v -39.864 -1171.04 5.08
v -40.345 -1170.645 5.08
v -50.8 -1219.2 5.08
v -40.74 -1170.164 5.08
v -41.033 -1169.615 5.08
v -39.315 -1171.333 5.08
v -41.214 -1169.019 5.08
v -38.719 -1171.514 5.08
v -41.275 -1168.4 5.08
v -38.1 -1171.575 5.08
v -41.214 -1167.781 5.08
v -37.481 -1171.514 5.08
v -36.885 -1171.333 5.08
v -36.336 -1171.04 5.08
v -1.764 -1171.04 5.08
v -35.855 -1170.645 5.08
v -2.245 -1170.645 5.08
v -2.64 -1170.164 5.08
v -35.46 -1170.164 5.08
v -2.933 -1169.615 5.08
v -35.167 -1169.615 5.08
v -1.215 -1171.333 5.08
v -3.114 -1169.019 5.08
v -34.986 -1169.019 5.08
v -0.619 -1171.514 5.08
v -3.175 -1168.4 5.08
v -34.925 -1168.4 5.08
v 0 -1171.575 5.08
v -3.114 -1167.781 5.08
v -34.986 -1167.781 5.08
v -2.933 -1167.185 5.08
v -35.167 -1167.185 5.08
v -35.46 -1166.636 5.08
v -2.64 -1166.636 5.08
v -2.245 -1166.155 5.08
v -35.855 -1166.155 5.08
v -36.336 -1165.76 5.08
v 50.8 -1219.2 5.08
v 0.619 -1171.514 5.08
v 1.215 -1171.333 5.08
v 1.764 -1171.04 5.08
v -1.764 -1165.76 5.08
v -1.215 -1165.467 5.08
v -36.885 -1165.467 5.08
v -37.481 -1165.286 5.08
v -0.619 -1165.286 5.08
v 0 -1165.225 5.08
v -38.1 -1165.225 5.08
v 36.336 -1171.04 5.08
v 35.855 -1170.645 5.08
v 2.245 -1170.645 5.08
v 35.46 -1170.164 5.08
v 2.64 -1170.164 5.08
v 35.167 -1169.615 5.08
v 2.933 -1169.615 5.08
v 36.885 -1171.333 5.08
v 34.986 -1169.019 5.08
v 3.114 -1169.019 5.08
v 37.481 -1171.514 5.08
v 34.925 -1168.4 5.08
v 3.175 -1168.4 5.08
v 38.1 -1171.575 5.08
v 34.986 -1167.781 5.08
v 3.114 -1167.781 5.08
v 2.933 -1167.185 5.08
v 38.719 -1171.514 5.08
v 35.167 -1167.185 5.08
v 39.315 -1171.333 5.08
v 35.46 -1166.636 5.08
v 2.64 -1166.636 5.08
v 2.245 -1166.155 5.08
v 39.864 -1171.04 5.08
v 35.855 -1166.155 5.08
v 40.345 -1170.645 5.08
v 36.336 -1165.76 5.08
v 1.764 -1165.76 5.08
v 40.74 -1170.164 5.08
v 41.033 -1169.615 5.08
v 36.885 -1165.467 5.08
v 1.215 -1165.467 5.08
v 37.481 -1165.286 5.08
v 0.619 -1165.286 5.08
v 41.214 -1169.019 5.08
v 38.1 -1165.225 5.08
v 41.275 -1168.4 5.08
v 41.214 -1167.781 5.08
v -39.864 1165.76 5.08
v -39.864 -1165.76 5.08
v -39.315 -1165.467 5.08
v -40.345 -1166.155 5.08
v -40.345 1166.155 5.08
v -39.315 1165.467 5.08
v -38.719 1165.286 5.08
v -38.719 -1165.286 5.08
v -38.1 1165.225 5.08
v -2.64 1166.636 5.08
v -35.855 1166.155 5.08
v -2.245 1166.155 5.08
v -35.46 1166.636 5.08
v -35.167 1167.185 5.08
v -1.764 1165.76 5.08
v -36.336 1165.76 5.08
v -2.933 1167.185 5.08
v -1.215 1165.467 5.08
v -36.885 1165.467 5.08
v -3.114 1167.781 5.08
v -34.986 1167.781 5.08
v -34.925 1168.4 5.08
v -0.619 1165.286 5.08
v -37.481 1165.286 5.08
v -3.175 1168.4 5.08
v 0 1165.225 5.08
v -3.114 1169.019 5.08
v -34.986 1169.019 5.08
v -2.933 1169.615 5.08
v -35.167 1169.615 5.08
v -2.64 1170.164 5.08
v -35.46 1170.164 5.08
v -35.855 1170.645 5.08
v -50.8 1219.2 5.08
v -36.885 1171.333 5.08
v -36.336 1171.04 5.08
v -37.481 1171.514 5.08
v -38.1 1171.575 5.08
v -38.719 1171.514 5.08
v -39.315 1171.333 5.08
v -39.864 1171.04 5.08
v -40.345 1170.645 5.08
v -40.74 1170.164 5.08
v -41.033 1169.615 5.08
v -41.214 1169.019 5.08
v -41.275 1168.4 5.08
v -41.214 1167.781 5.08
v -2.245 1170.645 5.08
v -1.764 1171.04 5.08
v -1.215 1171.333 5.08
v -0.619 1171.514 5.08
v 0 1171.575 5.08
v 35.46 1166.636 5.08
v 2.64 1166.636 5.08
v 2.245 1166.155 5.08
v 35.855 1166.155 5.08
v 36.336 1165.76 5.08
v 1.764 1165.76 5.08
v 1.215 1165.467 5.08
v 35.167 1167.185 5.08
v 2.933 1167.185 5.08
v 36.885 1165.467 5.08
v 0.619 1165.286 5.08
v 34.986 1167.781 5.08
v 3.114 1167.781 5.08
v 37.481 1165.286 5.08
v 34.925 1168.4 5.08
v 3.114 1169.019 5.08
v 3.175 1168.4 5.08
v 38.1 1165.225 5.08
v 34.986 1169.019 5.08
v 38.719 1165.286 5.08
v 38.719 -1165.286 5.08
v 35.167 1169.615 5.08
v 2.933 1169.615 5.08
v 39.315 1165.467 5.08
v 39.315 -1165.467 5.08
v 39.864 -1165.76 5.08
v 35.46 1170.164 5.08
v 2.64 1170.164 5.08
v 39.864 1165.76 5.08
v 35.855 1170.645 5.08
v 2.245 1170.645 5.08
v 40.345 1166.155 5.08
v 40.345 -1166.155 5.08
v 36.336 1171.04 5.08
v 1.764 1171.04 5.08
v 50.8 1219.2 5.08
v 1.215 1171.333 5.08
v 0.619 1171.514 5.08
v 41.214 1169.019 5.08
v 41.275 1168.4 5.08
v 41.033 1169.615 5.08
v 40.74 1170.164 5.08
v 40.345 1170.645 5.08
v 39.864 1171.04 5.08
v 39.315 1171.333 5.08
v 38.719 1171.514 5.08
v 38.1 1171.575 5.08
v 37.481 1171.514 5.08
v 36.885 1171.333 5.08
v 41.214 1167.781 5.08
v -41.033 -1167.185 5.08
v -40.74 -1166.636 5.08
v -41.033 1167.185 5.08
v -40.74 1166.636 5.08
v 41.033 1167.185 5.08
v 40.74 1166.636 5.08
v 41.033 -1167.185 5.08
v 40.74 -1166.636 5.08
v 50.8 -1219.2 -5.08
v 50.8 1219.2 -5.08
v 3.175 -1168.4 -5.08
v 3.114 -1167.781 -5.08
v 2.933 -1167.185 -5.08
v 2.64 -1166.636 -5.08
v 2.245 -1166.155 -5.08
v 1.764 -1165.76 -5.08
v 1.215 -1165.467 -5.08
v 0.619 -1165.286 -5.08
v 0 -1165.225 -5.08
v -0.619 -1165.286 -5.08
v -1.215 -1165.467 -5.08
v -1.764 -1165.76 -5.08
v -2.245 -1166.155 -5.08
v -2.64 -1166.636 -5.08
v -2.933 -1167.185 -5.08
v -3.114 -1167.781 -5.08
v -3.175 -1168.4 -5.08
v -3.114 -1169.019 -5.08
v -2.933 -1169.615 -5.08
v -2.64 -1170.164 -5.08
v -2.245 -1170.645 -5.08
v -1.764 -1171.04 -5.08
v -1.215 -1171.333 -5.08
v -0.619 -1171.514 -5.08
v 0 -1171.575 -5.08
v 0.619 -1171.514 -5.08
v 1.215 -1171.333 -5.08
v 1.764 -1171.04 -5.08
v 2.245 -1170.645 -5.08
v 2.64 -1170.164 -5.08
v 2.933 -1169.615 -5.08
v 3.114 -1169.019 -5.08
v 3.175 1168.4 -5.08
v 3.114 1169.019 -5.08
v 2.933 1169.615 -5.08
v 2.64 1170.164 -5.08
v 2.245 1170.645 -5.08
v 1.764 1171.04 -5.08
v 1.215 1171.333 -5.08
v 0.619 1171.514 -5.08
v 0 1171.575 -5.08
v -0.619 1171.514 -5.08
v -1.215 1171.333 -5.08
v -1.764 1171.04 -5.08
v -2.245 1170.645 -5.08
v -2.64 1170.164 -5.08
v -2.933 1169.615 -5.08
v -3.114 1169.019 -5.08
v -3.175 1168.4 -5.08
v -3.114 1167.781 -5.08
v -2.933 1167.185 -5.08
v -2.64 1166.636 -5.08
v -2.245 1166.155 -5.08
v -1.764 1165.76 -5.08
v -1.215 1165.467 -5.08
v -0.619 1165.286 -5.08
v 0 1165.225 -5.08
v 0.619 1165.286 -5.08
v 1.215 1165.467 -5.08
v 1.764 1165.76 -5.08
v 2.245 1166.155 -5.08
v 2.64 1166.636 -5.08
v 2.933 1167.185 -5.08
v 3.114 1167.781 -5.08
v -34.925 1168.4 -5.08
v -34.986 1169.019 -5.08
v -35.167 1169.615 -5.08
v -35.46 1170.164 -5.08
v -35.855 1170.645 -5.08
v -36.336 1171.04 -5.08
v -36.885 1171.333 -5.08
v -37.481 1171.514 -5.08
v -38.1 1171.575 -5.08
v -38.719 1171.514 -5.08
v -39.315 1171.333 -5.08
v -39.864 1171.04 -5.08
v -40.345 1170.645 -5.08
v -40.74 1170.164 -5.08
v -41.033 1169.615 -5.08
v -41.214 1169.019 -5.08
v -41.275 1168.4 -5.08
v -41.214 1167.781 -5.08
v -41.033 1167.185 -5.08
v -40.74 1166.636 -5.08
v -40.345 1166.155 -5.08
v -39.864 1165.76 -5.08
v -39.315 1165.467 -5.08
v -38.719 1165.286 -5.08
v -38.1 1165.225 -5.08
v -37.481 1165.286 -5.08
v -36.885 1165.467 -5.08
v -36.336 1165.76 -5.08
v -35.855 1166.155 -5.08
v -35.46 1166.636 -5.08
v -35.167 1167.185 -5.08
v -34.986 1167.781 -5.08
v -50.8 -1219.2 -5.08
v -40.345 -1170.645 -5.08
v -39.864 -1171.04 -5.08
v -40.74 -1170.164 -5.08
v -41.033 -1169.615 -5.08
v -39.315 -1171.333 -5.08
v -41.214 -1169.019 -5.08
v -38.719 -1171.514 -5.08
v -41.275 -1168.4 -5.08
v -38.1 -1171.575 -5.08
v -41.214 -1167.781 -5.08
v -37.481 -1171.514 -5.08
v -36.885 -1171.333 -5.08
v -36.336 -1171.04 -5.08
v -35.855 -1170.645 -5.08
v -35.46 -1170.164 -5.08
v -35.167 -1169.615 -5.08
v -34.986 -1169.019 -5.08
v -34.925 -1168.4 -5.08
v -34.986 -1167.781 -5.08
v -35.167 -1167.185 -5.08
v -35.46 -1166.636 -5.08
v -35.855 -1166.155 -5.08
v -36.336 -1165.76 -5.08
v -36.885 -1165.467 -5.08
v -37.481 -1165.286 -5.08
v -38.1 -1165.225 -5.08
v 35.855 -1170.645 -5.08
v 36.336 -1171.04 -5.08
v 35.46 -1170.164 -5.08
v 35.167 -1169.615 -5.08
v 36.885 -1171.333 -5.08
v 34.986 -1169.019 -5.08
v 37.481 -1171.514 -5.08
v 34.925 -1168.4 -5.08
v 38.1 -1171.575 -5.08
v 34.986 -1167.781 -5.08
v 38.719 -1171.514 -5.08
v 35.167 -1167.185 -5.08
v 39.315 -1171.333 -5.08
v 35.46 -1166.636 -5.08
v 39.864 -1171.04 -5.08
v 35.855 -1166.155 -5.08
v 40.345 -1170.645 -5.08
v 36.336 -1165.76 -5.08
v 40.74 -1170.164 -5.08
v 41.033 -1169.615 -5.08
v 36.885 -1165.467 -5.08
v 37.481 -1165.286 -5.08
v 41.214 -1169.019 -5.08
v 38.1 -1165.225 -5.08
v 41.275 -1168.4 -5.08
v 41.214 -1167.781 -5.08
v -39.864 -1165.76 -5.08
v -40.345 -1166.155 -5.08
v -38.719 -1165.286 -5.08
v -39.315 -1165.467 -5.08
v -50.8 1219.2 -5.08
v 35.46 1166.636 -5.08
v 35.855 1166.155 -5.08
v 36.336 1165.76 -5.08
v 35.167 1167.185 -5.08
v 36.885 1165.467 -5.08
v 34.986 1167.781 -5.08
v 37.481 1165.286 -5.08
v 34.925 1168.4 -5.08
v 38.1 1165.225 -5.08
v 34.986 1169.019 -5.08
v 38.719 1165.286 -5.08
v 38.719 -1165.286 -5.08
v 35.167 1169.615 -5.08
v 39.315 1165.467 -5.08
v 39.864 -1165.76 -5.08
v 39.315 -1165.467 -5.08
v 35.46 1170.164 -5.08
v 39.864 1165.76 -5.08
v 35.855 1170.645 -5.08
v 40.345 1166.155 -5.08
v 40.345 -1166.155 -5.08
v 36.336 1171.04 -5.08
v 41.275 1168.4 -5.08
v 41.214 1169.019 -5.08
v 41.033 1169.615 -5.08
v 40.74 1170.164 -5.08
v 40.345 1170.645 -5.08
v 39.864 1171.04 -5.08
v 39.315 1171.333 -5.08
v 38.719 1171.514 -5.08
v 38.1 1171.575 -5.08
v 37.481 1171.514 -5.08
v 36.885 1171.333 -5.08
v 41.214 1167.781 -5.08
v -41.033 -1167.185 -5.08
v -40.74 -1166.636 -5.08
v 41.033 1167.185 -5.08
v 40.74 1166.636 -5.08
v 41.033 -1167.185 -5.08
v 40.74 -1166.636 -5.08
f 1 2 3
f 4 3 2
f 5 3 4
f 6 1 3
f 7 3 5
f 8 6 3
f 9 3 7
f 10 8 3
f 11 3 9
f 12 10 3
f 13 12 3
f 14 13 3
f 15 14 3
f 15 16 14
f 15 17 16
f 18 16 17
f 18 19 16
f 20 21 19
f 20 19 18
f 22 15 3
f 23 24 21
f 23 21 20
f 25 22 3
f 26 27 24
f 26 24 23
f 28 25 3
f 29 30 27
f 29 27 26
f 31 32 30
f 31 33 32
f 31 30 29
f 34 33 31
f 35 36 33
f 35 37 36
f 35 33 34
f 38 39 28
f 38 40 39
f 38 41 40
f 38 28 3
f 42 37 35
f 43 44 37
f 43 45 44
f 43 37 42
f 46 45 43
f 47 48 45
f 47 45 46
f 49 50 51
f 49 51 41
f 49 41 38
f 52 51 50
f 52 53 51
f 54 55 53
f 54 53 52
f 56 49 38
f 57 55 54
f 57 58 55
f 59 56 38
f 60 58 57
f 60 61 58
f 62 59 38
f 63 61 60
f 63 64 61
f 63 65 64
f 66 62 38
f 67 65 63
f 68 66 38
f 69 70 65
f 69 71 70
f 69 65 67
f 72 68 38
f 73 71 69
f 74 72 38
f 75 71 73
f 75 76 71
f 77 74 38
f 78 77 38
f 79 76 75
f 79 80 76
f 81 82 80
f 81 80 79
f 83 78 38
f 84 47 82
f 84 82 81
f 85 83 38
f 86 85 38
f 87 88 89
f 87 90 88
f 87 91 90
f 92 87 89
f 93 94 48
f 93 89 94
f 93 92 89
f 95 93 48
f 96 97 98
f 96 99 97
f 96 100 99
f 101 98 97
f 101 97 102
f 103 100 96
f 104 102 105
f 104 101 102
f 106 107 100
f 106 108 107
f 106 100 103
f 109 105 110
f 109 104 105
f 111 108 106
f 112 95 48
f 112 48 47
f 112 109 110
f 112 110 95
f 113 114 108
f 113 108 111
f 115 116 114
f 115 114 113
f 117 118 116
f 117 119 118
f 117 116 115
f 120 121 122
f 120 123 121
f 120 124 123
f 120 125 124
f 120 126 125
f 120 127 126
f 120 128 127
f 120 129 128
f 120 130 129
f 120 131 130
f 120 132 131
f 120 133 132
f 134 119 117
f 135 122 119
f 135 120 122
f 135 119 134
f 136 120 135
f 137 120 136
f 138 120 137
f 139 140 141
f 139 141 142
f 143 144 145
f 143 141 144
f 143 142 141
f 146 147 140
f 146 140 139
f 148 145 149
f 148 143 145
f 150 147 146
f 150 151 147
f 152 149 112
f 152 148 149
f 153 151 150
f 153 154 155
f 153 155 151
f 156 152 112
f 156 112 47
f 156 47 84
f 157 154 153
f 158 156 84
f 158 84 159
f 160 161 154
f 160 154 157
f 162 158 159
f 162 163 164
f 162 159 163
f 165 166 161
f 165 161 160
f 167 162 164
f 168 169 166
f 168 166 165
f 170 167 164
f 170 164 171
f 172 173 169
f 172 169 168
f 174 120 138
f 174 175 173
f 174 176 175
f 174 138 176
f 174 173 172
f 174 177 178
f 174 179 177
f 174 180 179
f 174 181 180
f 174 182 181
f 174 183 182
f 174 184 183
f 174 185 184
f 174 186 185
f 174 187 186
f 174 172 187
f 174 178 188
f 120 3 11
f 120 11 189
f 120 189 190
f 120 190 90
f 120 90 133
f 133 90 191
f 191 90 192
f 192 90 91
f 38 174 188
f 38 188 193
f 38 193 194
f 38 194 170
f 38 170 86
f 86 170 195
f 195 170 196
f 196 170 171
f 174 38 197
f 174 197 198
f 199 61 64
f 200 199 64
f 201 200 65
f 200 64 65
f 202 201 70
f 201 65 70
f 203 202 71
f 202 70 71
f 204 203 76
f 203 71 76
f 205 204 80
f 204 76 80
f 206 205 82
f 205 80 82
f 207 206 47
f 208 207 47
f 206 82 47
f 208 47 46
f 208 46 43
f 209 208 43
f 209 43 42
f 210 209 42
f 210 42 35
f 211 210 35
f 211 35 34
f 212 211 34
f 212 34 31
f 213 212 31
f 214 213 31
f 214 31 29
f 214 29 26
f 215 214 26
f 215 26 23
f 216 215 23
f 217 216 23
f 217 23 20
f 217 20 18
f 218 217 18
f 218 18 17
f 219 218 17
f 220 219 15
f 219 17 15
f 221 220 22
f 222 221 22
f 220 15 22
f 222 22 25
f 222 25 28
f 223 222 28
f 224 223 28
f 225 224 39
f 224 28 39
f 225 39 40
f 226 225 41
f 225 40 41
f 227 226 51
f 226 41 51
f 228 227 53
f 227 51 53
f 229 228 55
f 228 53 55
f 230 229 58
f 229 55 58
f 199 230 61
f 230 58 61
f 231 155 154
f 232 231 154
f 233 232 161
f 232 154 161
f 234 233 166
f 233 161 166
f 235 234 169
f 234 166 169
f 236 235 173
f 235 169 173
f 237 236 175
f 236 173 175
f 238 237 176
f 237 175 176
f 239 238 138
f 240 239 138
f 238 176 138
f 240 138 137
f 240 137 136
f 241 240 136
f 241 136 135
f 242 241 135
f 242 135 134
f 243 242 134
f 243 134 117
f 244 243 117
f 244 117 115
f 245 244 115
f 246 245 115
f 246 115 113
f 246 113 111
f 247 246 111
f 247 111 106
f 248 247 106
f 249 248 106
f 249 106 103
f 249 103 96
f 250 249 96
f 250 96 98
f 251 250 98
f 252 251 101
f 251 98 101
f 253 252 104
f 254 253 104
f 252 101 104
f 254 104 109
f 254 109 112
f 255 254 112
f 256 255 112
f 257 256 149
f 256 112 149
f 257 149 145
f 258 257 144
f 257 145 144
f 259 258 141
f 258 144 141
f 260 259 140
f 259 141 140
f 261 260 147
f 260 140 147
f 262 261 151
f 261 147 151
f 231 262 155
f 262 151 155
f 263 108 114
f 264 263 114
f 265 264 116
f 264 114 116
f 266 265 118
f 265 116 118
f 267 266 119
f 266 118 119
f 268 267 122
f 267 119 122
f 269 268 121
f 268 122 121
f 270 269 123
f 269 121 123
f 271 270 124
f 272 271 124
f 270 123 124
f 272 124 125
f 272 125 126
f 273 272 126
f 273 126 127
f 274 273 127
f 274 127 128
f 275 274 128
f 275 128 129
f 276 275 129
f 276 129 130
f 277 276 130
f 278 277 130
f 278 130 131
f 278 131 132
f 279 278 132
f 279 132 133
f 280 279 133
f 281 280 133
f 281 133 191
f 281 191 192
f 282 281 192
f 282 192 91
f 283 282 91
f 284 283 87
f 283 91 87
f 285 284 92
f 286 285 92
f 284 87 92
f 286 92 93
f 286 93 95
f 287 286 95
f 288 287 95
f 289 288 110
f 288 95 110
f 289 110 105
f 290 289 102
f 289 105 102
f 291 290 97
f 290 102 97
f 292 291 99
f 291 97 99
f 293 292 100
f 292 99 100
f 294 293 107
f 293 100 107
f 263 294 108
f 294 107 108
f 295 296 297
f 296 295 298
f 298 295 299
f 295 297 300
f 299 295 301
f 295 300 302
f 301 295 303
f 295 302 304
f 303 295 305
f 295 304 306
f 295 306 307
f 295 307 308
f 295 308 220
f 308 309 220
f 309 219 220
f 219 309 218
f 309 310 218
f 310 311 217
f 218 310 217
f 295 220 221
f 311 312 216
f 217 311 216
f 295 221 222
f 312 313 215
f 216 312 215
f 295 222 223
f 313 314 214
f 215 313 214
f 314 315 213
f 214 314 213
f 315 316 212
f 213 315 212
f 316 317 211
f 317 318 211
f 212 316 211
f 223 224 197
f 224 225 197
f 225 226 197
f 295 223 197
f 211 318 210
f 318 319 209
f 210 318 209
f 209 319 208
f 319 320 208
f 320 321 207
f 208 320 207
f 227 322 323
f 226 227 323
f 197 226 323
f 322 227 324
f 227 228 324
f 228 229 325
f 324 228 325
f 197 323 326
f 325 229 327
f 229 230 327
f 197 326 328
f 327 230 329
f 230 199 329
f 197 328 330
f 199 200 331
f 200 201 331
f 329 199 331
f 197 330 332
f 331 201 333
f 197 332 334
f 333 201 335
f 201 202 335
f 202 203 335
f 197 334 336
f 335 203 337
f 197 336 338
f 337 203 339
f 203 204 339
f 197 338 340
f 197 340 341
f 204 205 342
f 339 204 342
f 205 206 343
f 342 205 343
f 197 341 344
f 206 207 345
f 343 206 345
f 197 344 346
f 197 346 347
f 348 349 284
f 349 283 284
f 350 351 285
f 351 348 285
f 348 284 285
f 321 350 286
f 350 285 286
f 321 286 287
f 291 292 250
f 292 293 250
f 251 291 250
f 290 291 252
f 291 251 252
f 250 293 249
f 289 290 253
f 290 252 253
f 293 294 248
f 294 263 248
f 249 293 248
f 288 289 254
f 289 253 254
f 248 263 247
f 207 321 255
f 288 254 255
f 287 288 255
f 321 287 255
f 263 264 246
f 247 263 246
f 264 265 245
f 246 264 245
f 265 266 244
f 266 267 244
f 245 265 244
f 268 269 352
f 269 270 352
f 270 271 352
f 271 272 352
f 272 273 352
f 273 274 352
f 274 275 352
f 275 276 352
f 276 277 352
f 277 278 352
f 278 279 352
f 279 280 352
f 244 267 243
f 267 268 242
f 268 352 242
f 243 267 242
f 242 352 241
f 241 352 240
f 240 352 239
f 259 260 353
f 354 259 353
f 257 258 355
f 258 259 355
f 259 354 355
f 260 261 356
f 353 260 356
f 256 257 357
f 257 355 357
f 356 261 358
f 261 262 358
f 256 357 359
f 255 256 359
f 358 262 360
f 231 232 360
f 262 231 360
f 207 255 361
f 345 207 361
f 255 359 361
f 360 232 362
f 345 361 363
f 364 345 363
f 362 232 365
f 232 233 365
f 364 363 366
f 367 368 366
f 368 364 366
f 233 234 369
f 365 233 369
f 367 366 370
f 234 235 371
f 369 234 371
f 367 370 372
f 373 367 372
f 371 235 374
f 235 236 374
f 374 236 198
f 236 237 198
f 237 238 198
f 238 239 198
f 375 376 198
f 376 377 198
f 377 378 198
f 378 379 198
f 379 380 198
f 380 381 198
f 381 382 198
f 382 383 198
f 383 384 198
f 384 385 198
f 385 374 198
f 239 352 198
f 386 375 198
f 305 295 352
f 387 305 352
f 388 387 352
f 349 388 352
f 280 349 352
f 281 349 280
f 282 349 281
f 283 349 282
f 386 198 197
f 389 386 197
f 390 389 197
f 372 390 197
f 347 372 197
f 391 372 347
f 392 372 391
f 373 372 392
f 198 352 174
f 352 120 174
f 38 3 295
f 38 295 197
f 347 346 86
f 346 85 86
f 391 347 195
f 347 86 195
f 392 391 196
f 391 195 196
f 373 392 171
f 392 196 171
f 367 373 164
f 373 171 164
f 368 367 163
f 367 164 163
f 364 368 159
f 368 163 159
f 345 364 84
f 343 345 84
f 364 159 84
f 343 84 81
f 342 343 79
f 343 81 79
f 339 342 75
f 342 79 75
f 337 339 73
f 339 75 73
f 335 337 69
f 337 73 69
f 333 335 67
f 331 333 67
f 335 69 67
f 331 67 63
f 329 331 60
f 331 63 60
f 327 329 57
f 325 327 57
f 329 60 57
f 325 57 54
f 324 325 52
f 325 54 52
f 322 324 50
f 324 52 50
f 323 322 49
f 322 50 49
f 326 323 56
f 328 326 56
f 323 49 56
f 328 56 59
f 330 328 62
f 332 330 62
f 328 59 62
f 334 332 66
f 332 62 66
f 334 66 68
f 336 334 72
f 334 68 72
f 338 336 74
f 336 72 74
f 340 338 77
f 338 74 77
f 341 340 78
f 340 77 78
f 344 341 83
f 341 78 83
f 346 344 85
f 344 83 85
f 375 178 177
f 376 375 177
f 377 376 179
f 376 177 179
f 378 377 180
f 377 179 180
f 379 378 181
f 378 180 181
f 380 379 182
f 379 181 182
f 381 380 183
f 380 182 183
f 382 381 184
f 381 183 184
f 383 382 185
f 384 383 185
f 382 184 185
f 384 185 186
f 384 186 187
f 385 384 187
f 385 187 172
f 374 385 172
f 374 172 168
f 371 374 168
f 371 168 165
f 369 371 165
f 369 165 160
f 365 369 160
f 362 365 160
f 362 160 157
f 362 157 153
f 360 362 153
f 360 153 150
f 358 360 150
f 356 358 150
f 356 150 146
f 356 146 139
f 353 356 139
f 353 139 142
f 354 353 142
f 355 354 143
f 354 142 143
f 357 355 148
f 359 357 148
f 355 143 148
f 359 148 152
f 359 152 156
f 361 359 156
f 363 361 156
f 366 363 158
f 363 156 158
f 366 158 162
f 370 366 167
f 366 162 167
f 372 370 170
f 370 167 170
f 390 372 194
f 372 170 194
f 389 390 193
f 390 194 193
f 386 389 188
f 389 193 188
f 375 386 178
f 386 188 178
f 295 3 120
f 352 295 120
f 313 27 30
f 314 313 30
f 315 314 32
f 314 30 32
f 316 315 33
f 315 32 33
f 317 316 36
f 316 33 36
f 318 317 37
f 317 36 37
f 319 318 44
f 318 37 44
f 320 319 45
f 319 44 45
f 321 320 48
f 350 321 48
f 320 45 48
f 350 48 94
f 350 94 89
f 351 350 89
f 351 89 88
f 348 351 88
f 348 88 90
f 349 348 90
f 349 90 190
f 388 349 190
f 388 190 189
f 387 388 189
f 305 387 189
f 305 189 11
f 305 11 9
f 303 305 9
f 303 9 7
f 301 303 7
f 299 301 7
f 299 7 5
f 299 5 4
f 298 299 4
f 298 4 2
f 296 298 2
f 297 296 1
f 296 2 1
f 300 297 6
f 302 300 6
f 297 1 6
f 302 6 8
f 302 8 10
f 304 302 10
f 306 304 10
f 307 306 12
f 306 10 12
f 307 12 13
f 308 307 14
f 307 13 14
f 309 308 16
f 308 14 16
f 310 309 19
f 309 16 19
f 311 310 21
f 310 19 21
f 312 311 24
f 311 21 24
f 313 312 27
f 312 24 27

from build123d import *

# Parameters (mm, degrees)
F0_W     = 101.6
F0_H     = 2438.4
F1_DEPTH = 5.08
F2_R     = 3.175
F3_DEPTH = 12.7


with BuildPart() as f1:
    # F0 (on Top) → F1 (new body, symmetric)
    with BuildSketch(Plane.XY):
        Rectangle(F0_W, F0_H)
    extrude(amount=F1_DEPTH, both=True)

    # F2 (on face) → F3 (cut, symmetric)
    with BuildSketch(Plane.XY.offset(5.08)):
        with Locations((0, -1168.4)):
            Circle(F2_R)
        with Locations((0, 1168.4)):
            Circle(F2_R)
        with Locations((-38.1, 1168.4)):
            Circle(F2_R)
        with Locations((38.1, 1168.4)):
            Circle(F2_R)
        with Locations((-38.1, -1168.4)):
            Circle(F2_R)
        with Locations((38.1, -1168.4)):
            Circle(F2_R)
    extrude(amount=F3_DEPTH, both=True, mode=Mode.SUBTRACT)


solid = f1.part
